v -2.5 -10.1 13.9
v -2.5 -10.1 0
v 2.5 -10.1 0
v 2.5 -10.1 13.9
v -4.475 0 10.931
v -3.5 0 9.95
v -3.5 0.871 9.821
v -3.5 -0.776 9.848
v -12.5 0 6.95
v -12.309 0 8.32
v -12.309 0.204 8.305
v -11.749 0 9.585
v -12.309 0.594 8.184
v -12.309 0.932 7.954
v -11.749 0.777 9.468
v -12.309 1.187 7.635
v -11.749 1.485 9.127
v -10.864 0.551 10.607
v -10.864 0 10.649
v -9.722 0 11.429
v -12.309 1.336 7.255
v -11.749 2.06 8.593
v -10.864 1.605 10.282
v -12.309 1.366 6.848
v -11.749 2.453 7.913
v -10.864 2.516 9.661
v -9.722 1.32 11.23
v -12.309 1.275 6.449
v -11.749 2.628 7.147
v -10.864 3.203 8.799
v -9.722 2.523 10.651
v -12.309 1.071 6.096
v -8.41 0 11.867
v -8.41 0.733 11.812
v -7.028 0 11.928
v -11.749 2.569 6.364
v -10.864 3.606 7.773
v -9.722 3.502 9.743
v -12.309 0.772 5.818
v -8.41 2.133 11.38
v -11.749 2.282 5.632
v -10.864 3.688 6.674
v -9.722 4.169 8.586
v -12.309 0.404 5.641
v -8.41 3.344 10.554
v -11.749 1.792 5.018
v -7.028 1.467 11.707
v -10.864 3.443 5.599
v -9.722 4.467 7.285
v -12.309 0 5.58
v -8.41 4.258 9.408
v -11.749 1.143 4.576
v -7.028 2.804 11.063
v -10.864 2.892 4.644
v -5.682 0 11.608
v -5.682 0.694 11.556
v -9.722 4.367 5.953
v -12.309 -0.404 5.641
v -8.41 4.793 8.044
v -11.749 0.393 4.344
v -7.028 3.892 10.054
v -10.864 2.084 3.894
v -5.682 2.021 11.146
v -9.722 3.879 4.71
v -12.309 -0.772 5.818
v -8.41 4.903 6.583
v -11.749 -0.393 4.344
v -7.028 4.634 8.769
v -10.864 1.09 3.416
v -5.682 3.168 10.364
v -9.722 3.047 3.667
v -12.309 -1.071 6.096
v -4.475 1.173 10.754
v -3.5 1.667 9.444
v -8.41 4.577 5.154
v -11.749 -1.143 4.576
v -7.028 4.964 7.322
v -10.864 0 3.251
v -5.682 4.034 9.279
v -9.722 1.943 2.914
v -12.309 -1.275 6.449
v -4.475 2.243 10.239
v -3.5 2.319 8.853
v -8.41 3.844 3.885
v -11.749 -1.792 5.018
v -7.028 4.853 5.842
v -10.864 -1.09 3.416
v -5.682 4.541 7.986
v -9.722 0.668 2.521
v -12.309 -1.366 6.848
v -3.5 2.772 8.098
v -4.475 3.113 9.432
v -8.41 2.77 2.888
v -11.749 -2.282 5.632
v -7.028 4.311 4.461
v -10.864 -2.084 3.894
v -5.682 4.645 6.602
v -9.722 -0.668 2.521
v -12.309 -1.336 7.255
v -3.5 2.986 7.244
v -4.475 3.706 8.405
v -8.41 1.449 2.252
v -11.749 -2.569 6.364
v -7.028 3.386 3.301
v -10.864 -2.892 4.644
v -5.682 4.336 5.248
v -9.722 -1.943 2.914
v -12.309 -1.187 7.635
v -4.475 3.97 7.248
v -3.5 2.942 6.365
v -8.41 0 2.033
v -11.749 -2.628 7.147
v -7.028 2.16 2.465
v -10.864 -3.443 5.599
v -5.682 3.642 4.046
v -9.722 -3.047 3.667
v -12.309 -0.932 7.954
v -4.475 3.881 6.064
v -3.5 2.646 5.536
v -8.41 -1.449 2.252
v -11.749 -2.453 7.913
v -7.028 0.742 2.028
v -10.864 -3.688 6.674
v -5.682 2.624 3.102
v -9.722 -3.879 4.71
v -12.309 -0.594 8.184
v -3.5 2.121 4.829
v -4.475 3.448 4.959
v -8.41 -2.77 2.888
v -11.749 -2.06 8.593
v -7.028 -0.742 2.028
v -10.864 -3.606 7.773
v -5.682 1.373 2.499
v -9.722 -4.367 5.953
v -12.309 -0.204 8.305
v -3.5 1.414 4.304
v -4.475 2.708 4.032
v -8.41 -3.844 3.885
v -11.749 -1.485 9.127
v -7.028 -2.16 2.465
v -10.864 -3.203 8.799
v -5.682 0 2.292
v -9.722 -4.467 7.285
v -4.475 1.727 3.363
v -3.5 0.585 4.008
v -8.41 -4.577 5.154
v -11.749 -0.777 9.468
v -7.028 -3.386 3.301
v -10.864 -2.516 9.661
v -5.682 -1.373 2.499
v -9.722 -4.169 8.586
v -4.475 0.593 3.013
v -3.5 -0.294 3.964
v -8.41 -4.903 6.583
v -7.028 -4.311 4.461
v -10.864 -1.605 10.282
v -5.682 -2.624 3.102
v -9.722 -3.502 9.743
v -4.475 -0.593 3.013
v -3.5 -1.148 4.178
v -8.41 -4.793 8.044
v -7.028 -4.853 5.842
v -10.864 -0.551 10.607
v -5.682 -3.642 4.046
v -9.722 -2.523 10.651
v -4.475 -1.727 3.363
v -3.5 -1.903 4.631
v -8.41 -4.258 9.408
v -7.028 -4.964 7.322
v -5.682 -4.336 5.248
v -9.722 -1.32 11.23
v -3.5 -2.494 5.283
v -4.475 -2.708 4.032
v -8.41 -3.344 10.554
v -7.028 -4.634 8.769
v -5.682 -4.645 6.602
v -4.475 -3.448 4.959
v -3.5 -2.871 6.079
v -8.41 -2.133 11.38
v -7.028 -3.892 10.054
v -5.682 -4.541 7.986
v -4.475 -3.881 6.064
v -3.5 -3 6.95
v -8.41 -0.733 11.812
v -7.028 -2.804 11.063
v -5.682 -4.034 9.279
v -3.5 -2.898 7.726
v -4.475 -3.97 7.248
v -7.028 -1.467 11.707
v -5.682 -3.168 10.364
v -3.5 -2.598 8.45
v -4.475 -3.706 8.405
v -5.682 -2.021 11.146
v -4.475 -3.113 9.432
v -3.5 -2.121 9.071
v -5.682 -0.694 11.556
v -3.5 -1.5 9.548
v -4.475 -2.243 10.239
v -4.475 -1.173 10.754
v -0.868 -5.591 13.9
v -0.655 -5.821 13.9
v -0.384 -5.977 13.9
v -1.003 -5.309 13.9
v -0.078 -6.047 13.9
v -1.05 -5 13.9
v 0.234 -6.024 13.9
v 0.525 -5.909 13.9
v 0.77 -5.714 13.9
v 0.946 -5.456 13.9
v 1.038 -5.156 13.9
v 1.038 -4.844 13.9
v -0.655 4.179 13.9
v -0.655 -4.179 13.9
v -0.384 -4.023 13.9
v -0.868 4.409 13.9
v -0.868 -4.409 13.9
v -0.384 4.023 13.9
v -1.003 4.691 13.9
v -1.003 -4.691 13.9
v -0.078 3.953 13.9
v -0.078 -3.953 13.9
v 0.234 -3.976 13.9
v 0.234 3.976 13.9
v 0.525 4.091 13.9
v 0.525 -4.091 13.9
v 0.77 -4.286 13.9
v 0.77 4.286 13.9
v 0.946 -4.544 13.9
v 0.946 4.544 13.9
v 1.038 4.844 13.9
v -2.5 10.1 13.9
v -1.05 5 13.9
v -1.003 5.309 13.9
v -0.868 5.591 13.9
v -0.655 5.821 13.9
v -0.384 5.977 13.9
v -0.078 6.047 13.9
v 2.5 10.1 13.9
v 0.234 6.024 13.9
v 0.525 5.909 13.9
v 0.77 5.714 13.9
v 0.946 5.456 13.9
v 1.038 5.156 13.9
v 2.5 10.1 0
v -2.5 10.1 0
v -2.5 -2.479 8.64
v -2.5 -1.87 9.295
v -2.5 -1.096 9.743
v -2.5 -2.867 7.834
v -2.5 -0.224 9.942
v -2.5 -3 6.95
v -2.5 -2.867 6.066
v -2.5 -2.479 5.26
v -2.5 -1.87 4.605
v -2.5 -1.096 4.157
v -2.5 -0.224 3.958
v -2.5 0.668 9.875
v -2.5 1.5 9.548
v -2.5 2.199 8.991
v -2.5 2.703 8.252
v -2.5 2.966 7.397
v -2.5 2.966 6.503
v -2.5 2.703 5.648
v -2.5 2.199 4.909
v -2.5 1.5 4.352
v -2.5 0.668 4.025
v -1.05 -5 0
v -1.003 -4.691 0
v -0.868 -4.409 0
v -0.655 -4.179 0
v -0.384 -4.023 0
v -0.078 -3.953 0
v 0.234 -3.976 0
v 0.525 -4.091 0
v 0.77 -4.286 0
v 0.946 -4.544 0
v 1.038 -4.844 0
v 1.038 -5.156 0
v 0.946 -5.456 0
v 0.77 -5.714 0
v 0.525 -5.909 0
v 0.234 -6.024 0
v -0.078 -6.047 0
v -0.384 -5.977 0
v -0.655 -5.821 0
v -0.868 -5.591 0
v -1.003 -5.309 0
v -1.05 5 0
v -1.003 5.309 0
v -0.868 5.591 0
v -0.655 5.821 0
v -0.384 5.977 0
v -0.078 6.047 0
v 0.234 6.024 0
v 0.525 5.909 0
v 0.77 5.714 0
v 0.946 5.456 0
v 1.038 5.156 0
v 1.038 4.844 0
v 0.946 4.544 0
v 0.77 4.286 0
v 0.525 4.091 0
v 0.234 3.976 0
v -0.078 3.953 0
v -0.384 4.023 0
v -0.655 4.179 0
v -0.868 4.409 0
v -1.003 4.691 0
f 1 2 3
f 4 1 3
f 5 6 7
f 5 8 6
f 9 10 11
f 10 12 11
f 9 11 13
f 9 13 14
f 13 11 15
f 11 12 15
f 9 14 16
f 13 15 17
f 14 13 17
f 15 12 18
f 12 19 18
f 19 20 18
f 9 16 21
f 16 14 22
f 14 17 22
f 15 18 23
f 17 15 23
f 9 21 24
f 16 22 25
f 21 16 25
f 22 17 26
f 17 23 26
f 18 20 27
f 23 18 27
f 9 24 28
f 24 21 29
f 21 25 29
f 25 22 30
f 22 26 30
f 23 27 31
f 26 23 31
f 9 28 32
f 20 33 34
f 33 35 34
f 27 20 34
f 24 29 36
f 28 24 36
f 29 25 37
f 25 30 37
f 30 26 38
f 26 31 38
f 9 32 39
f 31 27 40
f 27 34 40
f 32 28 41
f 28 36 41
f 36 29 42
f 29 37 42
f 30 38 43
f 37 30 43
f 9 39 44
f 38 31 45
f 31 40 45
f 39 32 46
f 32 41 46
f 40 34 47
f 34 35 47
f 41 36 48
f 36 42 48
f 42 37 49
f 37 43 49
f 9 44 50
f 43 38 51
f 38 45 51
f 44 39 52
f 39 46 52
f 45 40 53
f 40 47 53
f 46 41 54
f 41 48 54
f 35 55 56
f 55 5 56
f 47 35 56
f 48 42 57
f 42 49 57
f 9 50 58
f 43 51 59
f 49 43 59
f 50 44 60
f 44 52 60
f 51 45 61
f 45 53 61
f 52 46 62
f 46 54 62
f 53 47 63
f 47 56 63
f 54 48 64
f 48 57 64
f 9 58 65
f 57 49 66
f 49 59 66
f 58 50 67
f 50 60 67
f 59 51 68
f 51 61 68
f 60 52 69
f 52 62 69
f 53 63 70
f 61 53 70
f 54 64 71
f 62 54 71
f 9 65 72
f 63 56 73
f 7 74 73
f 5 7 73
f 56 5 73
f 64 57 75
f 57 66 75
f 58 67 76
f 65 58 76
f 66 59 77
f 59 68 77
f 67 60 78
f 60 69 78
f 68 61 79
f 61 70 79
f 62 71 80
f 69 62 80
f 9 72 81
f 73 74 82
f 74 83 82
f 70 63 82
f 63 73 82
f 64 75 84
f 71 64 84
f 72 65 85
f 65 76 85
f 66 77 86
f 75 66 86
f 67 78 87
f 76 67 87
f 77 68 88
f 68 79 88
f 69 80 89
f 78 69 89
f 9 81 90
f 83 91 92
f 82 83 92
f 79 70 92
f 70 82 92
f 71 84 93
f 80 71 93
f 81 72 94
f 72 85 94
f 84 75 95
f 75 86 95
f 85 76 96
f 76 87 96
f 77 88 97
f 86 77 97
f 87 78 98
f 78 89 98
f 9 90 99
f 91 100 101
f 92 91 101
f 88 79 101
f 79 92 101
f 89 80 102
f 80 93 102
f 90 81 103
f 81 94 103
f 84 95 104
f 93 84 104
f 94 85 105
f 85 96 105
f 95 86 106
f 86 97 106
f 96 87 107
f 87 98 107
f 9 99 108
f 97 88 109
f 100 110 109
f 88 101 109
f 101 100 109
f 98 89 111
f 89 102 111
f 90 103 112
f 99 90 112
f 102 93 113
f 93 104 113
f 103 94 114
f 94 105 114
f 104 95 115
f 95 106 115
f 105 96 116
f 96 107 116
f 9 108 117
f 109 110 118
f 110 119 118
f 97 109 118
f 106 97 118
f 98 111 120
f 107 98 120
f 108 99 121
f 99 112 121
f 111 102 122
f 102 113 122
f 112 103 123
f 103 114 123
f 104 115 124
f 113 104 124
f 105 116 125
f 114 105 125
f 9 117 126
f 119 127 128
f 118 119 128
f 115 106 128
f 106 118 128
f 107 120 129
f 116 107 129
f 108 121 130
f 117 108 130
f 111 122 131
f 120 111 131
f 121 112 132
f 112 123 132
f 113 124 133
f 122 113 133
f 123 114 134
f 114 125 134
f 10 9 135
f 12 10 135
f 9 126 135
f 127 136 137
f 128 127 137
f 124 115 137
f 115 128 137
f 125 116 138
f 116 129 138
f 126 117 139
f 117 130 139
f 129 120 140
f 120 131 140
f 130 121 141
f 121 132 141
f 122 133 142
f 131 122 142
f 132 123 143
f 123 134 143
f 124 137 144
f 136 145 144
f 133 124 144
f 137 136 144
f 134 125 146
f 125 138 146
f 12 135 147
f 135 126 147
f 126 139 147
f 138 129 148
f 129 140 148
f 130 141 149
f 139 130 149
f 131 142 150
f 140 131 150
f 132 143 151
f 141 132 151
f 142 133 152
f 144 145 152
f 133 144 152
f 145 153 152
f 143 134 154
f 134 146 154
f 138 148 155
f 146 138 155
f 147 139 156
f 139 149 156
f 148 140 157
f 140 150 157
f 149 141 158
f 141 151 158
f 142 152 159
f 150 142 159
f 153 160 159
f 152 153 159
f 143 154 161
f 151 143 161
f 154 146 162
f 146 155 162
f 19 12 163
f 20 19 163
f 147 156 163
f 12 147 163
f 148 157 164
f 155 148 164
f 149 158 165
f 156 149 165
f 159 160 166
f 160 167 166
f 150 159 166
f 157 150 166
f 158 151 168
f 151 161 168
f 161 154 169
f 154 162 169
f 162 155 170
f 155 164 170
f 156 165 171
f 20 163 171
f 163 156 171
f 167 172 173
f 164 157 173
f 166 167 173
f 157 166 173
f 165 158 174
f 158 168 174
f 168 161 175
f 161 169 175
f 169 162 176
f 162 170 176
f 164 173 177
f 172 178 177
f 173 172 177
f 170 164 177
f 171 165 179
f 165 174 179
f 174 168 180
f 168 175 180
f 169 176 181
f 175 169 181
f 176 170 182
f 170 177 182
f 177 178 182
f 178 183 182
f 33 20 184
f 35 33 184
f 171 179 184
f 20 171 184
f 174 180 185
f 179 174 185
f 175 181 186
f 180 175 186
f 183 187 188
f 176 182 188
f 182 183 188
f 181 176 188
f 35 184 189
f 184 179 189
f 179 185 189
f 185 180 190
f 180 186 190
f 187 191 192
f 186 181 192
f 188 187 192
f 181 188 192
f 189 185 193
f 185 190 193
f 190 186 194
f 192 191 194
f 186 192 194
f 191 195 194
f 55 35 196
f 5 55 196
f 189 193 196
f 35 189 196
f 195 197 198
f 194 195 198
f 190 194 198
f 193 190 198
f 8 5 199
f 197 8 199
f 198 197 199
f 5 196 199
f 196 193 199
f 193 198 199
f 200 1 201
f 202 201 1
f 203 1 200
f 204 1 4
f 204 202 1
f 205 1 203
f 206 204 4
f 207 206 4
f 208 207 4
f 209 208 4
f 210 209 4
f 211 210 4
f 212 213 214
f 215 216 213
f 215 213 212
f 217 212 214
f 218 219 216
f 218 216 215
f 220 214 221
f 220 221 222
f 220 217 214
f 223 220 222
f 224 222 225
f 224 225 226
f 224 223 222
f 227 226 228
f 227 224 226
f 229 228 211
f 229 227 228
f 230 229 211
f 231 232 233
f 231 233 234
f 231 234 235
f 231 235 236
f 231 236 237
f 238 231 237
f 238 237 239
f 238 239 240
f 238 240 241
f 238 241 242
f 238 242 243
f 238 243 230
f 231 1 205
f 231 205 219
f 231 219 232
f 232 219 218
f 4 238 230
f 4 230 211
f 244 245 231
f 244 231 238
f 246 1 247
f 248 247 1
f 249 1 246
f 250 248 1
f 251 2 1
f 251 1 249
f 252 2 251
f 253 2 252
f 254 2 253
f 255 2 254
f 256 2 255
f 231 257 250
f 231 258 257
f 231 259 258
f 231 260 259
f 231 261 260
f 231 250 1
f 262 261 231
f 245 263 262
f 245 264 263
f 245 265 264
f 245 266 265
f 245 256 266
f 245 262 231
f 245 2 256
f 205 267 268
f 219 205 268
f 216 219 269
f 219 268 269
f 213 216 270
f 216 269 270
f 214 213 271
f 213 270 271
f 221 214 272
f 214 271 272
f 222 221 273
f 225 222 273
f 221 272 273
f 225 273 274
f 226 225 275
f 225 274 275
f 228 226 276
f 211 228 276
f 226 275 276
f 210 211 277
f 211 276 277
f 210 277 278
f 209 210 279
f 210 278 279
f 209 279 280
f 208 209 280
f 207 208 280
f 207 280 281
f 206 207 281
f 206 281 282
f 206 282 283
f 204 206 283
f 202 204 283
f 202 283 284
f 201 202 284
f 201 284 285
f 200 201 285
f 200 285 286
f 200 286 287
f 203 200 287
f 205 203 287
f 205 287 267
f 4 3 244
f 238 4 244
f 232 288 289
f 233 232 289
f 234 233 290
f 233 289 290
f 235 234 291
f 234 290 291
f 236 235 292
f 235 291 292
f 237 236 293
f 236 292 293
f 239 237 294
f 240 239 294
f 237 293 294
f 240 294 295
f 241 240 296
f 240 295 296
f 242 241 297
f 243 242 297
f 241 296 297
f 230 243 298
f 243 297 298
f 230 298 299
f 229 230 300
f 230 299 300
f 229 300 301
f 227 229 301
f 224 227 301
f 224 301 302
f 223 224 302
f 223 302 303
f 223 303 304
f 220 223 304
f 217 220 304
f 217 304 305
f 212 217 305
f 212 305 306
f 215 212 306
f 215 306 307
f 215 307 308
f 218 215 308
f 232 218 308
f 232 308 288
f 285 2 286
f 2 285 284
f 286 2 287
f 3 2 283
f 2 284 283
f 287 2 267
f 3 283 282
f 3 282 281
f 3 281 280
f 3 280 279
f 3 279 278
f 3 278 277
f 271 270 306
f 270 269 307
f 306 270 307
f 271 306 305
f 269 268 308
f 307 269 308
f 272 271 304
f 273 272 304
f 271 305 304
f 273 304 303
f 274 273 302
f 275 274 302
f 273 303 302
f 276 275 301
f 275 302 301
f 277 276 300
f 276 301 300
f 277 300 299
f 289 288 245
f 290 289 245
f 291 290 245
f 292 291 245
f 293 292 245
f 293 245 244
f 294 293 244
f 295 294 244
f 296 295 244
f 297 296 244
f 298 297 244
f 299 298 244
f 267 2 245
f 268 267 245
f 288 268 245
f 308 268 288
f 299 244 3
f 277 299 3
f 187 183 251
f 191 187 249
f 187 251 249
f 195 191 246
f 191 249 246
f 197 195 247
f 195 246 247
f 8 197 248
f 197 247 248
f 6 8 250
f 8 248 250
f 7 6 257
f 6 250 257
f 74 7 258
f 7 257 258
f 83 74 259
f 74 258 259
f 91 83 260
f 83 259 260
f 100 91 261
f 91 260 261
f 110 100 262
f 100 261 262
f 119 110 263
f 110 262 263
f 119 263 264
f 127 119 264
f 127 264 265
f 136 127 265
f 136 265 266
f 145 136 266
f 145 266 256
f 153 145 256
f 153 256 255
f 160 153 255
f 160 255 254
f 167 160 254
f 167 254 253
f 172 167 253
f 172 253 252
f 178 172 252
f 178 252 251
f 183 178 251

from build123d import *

# Parameters (mm, degrees)
ESQUISSE1_W             = 5
ESQUISSE1_H             = 20.2
BOSS_EXTRU_1_DEPTH      = 13.9
ESQUISSE4_R             = 1.05
ENL_V_MAT_EXTRU_1_DEPTH = 18.362891464
SKETCH1_R               = 3
BOSS_EXTRUDE1_DEPTH     = 1


with BuildPart() as part:
    # Esquisse1 → Boss.-Extru.1 (new body)
    with BuildSketch(Plane.XY):
        Rectangle(ESQUISSE1_W, ESQUISSE1_H)
    extrude(amount=BOSS_EXTRU_1_DEPTH)

    # Esquisse4 → Enlèv. mat.-Extru.1 (cut, through all)
    with BuildSketch(Plane(origin=(0, 0, 0), x_dir=(-1, 0, 0), z_dir=(0, 0, -1))):
        with Locations((0, 5)):
            Circle(ESQUISSE4_R)
        with Locations((0, -5)):
            Circle(ESQUISSE4_R)
    extrude(amount=-ENL_V_MAT_EXTRU_1_DEPTH, mode=Mode.SUBTRACT)

    # Sketch1 → Boss-Extrude1 (add)
    with BuildSketch(Plane.ZY.offset(2.5)):
        with Locations(Location((6.95, 0, 0), (0, 0, 270))):
            Circle(SKETCH1_R)
    extrude(amount=BOSS_EXTRUDE1_DEPTH)

    # Sketch5 → Revolve4 (revolve)
    with BuildSketch(Plane(origin=(0, 0, 0), x_dir=(-1, 0, 0), z_dir=(0, -1, 0))):
        with BuildLine():
            Line((3.5, -6.95), (12.5, -6.95))
            ThreePointArc((12.5, -6.95), (9.08113883, -11.69341649), (3.5, -9.95))
            Line((3.5, -9.95), (3.5, -6.95))
        make_face()
    revolve(axis=Axis((-3.5, 0, 6.95), (-1, 0, 0)))


solid = part.part
